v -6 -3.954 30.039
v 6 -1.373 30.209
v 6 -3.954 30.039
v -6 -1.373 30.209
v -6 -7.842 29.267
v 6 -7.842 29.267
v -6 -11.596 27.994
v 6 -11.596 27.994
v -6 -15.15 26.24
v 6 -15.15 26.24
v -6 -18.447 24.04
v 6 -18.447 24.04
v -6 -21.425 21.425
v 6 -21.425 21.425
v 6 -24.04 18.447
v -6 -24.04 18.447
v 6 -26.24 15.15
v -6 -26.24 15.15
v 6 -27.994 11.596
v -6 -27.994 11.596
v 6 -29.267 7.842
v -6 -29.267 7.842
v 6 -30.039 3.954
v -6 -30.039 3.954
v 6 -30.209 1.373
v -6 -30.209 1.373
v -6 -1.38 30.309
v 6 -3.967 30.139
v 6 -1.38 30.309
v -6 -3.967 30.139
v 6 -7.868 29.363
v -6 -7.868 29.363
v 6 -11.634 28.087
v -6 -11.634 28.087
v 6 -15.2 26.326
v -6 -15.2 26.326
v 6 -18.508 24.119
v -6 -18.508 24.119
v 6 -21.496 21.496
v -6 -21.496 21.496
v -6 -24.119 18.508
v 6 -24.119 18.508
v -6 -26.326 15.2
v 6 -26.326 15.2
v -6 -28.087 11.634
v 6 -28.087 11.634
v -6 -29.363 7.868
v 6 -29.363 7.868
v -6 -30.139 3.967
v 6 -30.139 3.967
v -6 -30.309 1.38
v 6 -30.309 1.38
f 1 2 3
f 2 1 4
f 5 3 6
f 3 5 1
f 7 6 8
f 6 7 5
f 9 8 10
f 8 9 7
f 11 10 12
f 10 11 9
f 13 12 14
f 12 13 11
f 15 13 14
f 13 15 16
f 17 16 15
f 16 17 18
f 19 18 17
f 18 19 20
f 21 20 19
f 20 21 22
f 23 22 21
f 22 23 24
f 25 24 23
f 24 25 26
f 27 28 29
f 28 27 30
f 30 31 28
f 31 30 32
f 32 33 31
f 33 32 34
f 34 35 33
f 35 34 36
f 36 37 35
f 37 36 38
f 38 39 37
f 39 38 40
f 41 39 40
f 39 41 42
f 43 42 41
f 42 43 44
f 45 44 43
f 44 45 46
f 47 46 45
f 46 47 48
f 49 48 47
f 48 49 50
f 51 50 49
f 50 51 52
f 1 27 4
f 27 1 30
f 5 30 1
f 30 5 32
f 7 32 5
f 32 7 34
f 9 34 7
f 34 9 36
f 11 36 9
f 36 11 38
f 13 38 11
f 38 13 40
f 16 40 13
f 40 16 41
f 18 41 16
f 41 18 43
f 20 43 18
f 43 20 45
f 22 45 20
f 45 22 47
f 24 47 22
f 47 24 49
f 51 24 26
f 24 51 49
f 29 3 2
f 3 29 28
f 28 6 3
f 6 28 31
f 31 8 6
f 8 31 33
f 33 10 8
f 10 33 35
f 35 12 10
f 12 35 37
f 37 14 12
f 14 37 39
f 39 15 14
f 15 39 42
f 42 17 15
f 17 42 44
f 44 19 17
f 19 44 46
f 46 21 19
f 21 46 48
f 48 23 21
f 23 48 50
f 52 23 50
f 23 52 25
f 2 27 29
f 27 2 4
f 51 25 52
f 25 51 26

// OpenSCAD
use <../lib.scad>
function ldraw_lib__6342869ac01() = [
// 0 Sticker  0.8 x  5.6 Rectangle Chrome (Formed)
// 0 Name: 6342869ac01.dat
// 0 Author: Orion Pobursky [OrionP]
// 0 !LDRAW_ORG Part UPDATE 2022-04
// 0 !LICENSE Licensed under CC BY 2.0 and CC BY 4.0 : see CAreadme.txt
// 
// 0 BFC CERTIFY CCW
  [0,"BFC","CERTIFY"],
  [0,"BFC","CCW"],
// 
// 0 !KEYWORDS Discovery, Set 10283
// 
// 0 !HISTORY 2022-07-18 [PTadmin] Official Update 2022-04
// 
// 
// 4 383 -15 -75.0986 -9.8854 -15 -75.5237 -3.4334 15 -75.5237 -3.4334 15 -75.0986 -9.8854
  [4,383,-15,-75.0986,-9.8854,-15,-75.5237,-3.4334,15,-75.5237,-3.4334,15,-75.0986,-9.8854],
// 4 383 -15 -73.1669 -19.6041 -15 -75.0986 -9.8854 15 -75.0986 -9.8854 15 -73.1669 -19.6041
  [4,383,-15,-73.1669,-19.6041,-15,-75.0986,-9.8854,15,-75.0986,-9.8854,15,-73.1669,-19.6041],
// 4 383 -15 -69.9854 -28.9895 -15 -73.1669 -19.6041 15 -73.1669 -19.6041 15 -69.9854 -28.9895
  [4,383,-15,-69.9854,-28.9895,-15,-73.1669,-19.6041,15,-73.1669,-19.6041,15,-69.9854,-28.9895],
// 4 383 -15 -65.5995 -37.875 -15 -69.9854 -28.9895 15 -69.9854 -28.9895 15 -65.5995 -37.875
  [4,383,-15,-65.5995,-37.875,-15,-69.9854,-28.9895,15,-69.9854,-28.9895,15,-65.5995,-37.875],
// 4 383 -15 -60.1001 -46.1166 -15 -65.5995 -37.875 15 -65.5995 -37.875 15 -60.1001 -46.1166
  [4,383,-15,-60.1001,-46.1166,-15,-65.5995,-37.875,15,-65.5995,-37.875,15,-60.1001,-46.1166],
// 4 383 -15 -53.5628 -53.5628 -15 -60.1001 -46.1166 15 -60.1001 -46.1166 15 -53.5628 -53.5628
  [4,383,-15,-53.5628,-53.5628,-15,-60.1001,-46.1166,15,-60.1001,-46.1166,15,-53.5628,-53.5628],
// 4 383 -15 -46.1166 -60.1001 -15 -53.5628 -53.5628 15 -53.5628 -53.5628 15 -46.1166 -60.1001
  [4,383,-15,-46.1166,-60.1001,-15,-53.5628,-53.5628,15,-53.5628,-53.5628,15,-46.1166,-60.1001],
// 4 383 -15 -37.875 -65.5995 -15 -46.1166 -60.1001 15 -46.1166 -60.1001 15 -37.875 -65.5995
  [4,383,-15,-37.875,-65.5995,-15,-46.1166,-60.1001,15,-46.1166,-60.1001,15,-37.875,-65.5995],
// 4 383 -15 -28.9895 -69.9854 -15 -37.875 -65.5995 15 -37.875 -65.5995 15 -28.9895 -69.9854
  [4,383,-15,-28.9895,-69.9854,-15,-37.875,-65.5995,15,-37.875,-65.5995,15,-28.9895,-69.9854],
// 4 383 -15 -19.6041 -73.1669 -15 -28.9895 -69.9854 15 -28.9895 -69.9854 15 -19.6041 -73.1669
  [4,383,-15,-19.6041,-73.1669,-15,-28.9895,-69.9854,15,-28.9895,-69.9854,15,-19.6041,-73.1669],
// 4 383 -15 -9.8854 -75.0986 -15 -19.6041 -73.1669 15 -19.6041 -73.1669 15 -9.8854 -75.0986
  [4,383,-15,-9.8854,-75.0986,-15,-19.6041,-73.1669,15,-19.6041,-73.1669,15,-9.8854,-75.0986],
// 4 383 -15 -3.4334 -75.5237 -15 -9.8854 -75.0986 15 -9.8854 -75.0986 15 -3.4334 -75.5237
  [4,383,-15,-3.4334,-75.5237,-15,-9.8854,-75.0986,15,-9.8854,-75.0986,15,-3.4334,-75.5237],
// 
// 5 24 15 -75.0986 -9.8854 -15 -75.0986 -9.8854 15 -75.5237 -3.4334 15 -73.1669 -19.6041
  [5,24,15,-75.0986,-9.8854,-15,-75.0986,-9.8854,15,-75.5237,-3.4334,15,-73.1669,-19.6041],
// 5 24 15 -73.1669 -19.6041 -15 -73.1669 -19.6041 15 -75.0986 -9.8854 15 -69.9854 -28.9895
  [5,24,15,-73.1669,-19.6041,-15,-73.1669,-19.6041,15,-75.0986,-9.8854,15,-69.9854,-28.9895],
// 5 24 15 -69.9854 -28.9895 -15 -69.9854 -28.9895 15 -73.1669 -19.6041 15 -65.5995 -37.875
  [5,24,15,-69.9854,-28.9895,-15,-69.9854,-28.9895,15,-73.1669,-19.6041,15,-65.5995,-37.875],
// 5 24 15 -65.5995 -37.875 -15 -65.5995 -37.875 15 -69.9854 -28.9895 15 -60.1001 -46.1166
  [5,24,15,-65.5995,-37.875,-15,-65.5995,-37.875,15,-69.9854,-28.9895,15,-60.1001,-46.1166],
// 5 24 15 -60.1001 -46.1166 -15 -60.1001 -46.1166 15 -65.5995 -37.875 15 -53.5628 -53.5628
  [5,24,15,-60.1001,-46.1166,-15,-60.1001,-46.1166,15,-65.5995,-37.875,15,-53.5628,-53.5628],
// 5 24 15 -53.5628 -53.5628 -15 -53.5628 -53.5628 15 -60.1001 -46.1166 15 -46.1166 -60.1001
  [5,24,15,-53.5628,-53.5628,-15,-53.5628,-53.5628,15,-60.1001,-46.1166,15,-46.1166,-60.1001],
// 5 24 15 -46.1166 -60.1001 -15 -46.1166 -60.1001 15 -53.5628 -53.5628 15 -37.875 -65.5995
  [5,24,15,-46.1166,-60.1001,-15,-46.1166,-60.1001,15,-53.5628,-53.5628,15,-37.875,-65.5995],
// 5 24 15 -37.875 -65.5995 -15 -37.875 -65.5995 15 -46.1166 -60.1001 15 -28.9895 -69.9854
  [5,24,15,-37.875,-65.5995,-15,-37.875,-65.5995,15,-46.1166,-60.1001,15,-28.9895,-69.9854],
// 5 24 15 -28.9895 -69.9854 -15 -28.9895 -69.9854 15 -37.875 -65.5995 15 -19.6041 -73.1669
  [5,24,15,-28.9895,-69.9854,-15,-28.9895,-69.9854,15,-37.875,-65.5995,15,-19.6041,-73.1669],
// 5 24 15 -19.6041 -73.1669 -15 -19.6041 -73.1669 15 -28.9895 -69.9854 15 -9.8854 -75.0986
  [5,24,15,-19.6041,-73.1669,-15,-19.6041,-73.1669,15,-28.9895,-69.9854,15,-9.8854,-75.0986],
// 5 24 15 -9.8854 -75.0986 -15 -9.8854 -75.0986 15 -19.6041 -73.1669 15 -3.4334 -75.5237
  [5,24,15,-9.8854,-75.0986,-15,-9.8854,-75.0986,15,-19.6041,-73.1669,15,-3.4334,-75.5237],
// 
// 4 16 15 -75.7727 -3.4498 -15 -75.7727 -3.4498 -15 -75.3464 -9.918 15 -75.3464 -9.918
  [4,16,15,-75.7727,-3.4498,-15,-75.7727,-3.4498,-15,-75.3464,-9.918,15,-75.3464,-9.918],
// 4 16 15 -75.3464 -9.918 -15 -75.3464 -9.918 -15 -73.4084 -19.6688 15 -73.4084 -19.6688
  [4,16,15,-75.3464,-9.918,-15,-75.3464,-9.918,-15,-73.4084,-19.6688,15,-73.4084,-19.6688],
// 4 16 15 -73.4084 -19.6688 -15 -73.4084 -19.6688 -15 -70.2164 -29.0852 15 -70.2164 -29.0852
  [4,16,15,-73.4084,-19.6688,-15,-73.4084,-19.6688,-15,-70.2164,-29.0852,15,-70.2164,-29.0852],
// 4 16 15 -70.2164 -29.0852 -15 -70.2164 -29.0852 -15 -65.816 -38 15 -65.816 -38
  [4,16,15,-70.2164,-29.0852,-15,-70.2164,-29.0852,-15,-65.816,-38,15,-65.816,-38],
// 4 16 15 -65.816 -38 -15 -65.816 -38 -15 -60.2984 -46.2688 15 -60.2984 -46.2688
  [4,16,15,-65.816,-38,-15,-65.816,-38,-15,-60.2984,-46.2688,15,-60.2984,-46.2688],
// 4 16 15 -60.2984 -46.2688 -15 -60.2984 -46.2688 -15 -53.7396 -53.7396 15 -53.7396 -53.7396
  [4,16,15,-60.2984,-46.2688,-15,-60.2984,-46.2688,-15,-53.7396,-53.7396,15,-53.7396,-53.7396],
// 4 16 15 -53.7396 -53.7396 -15 -53.7396 -53.7396 -15 -46.2688 -60.2984 15 -46.2688 -60.2984
  [4,16,15,-53.7396,-53.7396,-15,-53.7396,-53.7396,-15,-46.2688,-60.2984,15,-46.2688,-60.2984],
// 4 16 15 -46.2688 -60.2984 -15 -46.2688 -60.2984 -15 -38 -65.816 15 -38 -65.816
  [4,16,15,-46.2688,-60.2984,-15,-46.2688,-60.2984,-15,-38,-65.816,15,-38,-65.816],
// 4 16 15 -38 -65.816 -15 -38 -65.816 -15 -29.0852 -70.2164 15 -29.0852 -70.2164
  [4,16,15,-38,-65.816,-15,-38,-65.816,-15,-29.0852,-70.2164,15,-29.0852,-70.2164],
// 4 16 15 -29.0852 -70.2164 -15 -29.0852 -70.2164 -15 -19.6688 -73.4084 15 -19.6688 -73.4084
  [4,16,15,-29.0852,-70.2164,-15,-29.0852,-70.2164,-15,-19.6688,-73.4084,15,-19.6688,-73.4084],
// 4 16 15 -19.6688 -73.4084 -15 -19.6688 -73.4084 -15 -9.918 -75.3464 15 -9.918 -75.3464
  [4,16,15,-19.6688,-73.4084,-15,-19.6688,-73.4084,-15,-9.918,-75.3464,15,-9.918,-75.3464],
// 4 16 15 -9.918 -75.3464 -15 -9.918 -75.3464 -15 -3.4498 -75.7727 15 -3.4498 -75.7727
  [4,16,15,-9.918,-75.3464,-15,-9.918,-75.3464,-15,-3.4498,-75.7727,15,-3.4498,-75.7727],
// 
// 5 24 15 -75.3464 -9.918 -15 -75.3464 -9.918 15 -75.7727 -3.4498 15 -73.4084 -19.6688
  [5,24,15,-75.3464,-9.918,-15,-75.3464,-9.918,15,-75.7727,-3.4498,15,-73.4084,-19.6688],
// 5 24 15 -73.4084 -19.6688 -15 -73.4084 -19.6688 15 -75.3464 -9.918 15 -70.2164 -29.0852
  [5,24,15,-73.4084,-19.6688,-15,-73.4084,-19.6688,15,-75.3464,-9.918,15,-70.2164,-29.0852],
// 5 24 15 -70.2164 -29.0852 -15 -70.2164 -29.0852 15 -73.4084 -19.6688 15 -65.816 -38
  [5,24,15,-70.2164,-29.0852,-15,-70.2164,-29.0852,15,-73.4084,-19.6688,15,-65.816,-38],
// 5 24 15 -65.816 -38 -15 -65.816 -38 15 -70.2164 -29.0852 15 -60.2984 -46.2688
  [5,24,15,-65.816,-38,-15,-65.816,-38,15,-70.2164,-29.0852,15,-60.2984,-46.2688],
// 5 24 15 -60.2984 -46.2688 -15 -60.2984 -46.2688 15 -65.816 -38 15 -53.7396 -53.7396
  [5,24,15,-60.2984,-46.2688,-15,-60.2984,-46.2688,15,-65.816,-38,15,-53.7396,-53.7396],
// 5 24 15 -53.7396 -53.7396 -15 -53.7396 -53.7396 15 -60.2984 -46.2688 15 -46.2688 -60.2984
  [5,24,15,-53.7396,-53.7396,-15,-53.7396,-53.7396,15,-60.2984,-46.2688,15,-46.2688,-60.2984],
// 5 24 15 -46.2688 -60.2984 -15 -46.2688 -60.2984 15 -53.7396 -53.7396 15 -38 -65.816
  [5,24,15,-46.2688,-60.2984,-15,-46.2688,-60.2984,15,-53.7396,-53.7396,15,-38,-65.816],
// 5 24 15 -38 -65.816 -15 -38 -65.816 15 -46.2688 -60.2984 15 -29.0852 -70.2164
  [5,24,15,-38,-65.816,-15,-38,-65.816,15,-46.2688,-60.2984,15,-29.0852,-70.2164],
// 5 24 15 -29.0852 -70.2164 -15 -29.0852 -70.2164 15 -38 -65.816 15 -19.6688 -73.4084
  [5,24,15,-29.0852,-70.2164,-15,-29.0852,-70.2164,15,-38,-65.816,15,-19.6688,-73.4084],
// 5 24 15 -19.6688 -73.4084 -15 -19.6688 -73.4084 15 -29.0852 -70.2164 15 -9.918 -75.3464
  [5,24,15,-19.6688,-73.4084,-15,-19.6688,-73.4084,15,-29.0852,-70.2164,15,-9.918,-75.3464],
// 5 24 15 -9.918 -75.3464 -15 -9.918 -75.3464 15 -19.6688 -73.4084 15 -3.4498 -75.7727
  [5,24,15,-9.918,-75.3464,-15,-9.918,-75.3464,15,-19.6688,-73.4084,15,-3.4498,-75.7727],
// 
// 4 16 -15 -75.0986 -9.8854 -15 -75.3464 -9.918 -15 -75.7727 -3.4498 -15 -75.5237 -3.4334
  [4,16,-15,-75.0986,-9.8854,-15,-75.3464,-9.918,-15,-75.7727,-3.4498,-15,-75.5237,-3.4334],
// 4 16 -15 -73.1669 -19.6041 -15 -73.4084 -19.6688 -15 -75.3464 -9.918 -15 -75.0986 -9.8854
  [4,16,-15,-73.1669,-19.6041,-15,-73.4084,-19.6688,-15,-75.3464,-9.918,-15,-75.0986,-9.8854],
// 4 16 -15 -69.9854 -28.9895 -15 -70.2164 -29.0852 -15 -73.4084 -19.6688 -15 -73.1669 -19.6041
  [4,16,-15,-69.9854,-28.9895,-15,-70.2164,-29.0852,-15,-73.4084,-19.6688,-15,-73.1669,-19.6041],
// 4 16 -15 -65.5995 -37.875 -15 -65.816 -38 -15 -70.2164 -29.0852 -15 -69.9854 -28.9895
  [4,16,-15,-65.5995,-37.875,-15,-65.816,-38,-15,-70.2164,-29.0852,-15,-69.9854,-28.9895],
// 4 16 -15 -60.1001 -46.1166 -15 -60.2984 -46.2688 -15 -65.816 -38 -15 -65.5995 -37.875
  [4,16,-15,-60.1001,-46.1166,-15,-60.2984,-46.2688,-15,-65.816,-38,-15,-65.5995,-37.875],
// 4 16 -15 -53.5628 -53.5628 -15 -53.7396 -53.7396 -15 -60.2984 -46.2688 -15 -60.1001 -46.1166
  [4,16,-15,-53.5628,-53.5628,-15,-53.7396,-53.7396,-15,-60.2984,-46.2688,-15,-60.1001,-46.1166],
// 4 16 -15 -46.1166 -60.1001 -15 -46.2688 -60.2984 -15 -53.7396 -53.7396 -15 -53.5628 -53.5628
  [4,16,-15,-46.1166,-60.1001,-15,-46.2688,-60.2984,-15,-53.7396,-53.7396,-15,-53.5628,-53.5628],
// 4 16 -15 -37.875 -65.5995 -15 -38 -65.816 -15 -46.2688 -60.2984 -15 -46.1166 -60.1001
  [4,16,-15,-37.875,-65.5995,-15,-38,-65.816,-15,-46.2688,-60.2984,-15,-46.1166,-60.1001],
// 4 16 -15 -28.9895 -69.9854 -15 -29.0852 -70.2164 -15 -38 -65.816 -15 -37.875 -65.5995
  [4,16,-15,-28.9895,-69.9854,-15,-29.0852,-70.2164,-15,-38,-65.816,-15,-37.875,-65.5995],
// 4 16 -15 -19.6041 -73.1669 -15 -19.6688 -73.4084 -15 -29.0852 -70.2164 -15 -28.9895 -69.9854
  [4,16,-15,-19.6041,-73.1669,-15,-19.6688,-73.4084,-15,-29.0852,-70.2164,-15,-28.9895,-69.9854],
// 4 16 -15 -9.8854 -75.0986 -15 -9.918 -75.3464 -15 -19.6688 -73.4084 -15 -19.6041 -73.1669
  [4,16,-15,-9.8854,-75.0986,-15,-9.918,-75.3464,-15,-19.6688,-73.4084,-15,-19.6041,-73.1669],
// 4 16 -15 -3.4334 -75.5237 -15 -3.4498 -75.7727 -15 -9.918 -75.3464 -15 -9.8854 -75.0986
  [4,16,-15,-3.4334,-75.5237,-15,-3.4498,-75.7727,-15,-9.918,-75.3464,-15,-9.8854,-75.0986],
// 
// 4 16 15 -75.7727 -3.4498 15 -75.3464 -9.918 15 -75.0986 -9.8854 15 -75.5237 -3.4334
  [4,16,15,-75.7727,-3.4498,15,-75.3464,-9.918,15,-75.0986,-9.8854,15,-75.5237,-3.4334],
// 4 16 15 -75.3464 -9.918 15 -73.4084 -19.6688 15 -73.1669 -19.6041 15 -75.0986 -9.8854
  [4,16,15,-75.3464,-9.918,15,-73.4084,-19.6688,15,-73.1669,-19.6041,15,-75.0986,-9.8854],
// 4 16 15 -73.4084 -19.6688 15 -70.2164 -29.0852 15 -69.9854 -28.9895 15 -73.1669 -19.6041
  [4,16,15,-73.4084,-19.6688,15,-70.2164,-29.0852,15,-69.9854,-28.9895,15,-73.1669,-19.6041],
// 4 16 15 -70.2164 -29.0852 15 -65.816 -38 15 -65.5995 -37.875 15 -69.9854 -28.9895
  [4,16,15,-70.2164,-29.0852,15,-65.816,-38,15,-65.5995,-37.875,15,-69.9854,-28.9895],
// 4 16 15 -65.816 -38 15 -60.2984 -46.2688 15 -60.1001 -46.1166 15 -65.5995 -37.875
  [4,16,15,-65.816,-38,15,-60.2984,-46.2688,15,-60.1001,-46.1166,15,-65.5995,-37.875],
// 4 16 15 -60.2984 -46.2688 15 -53.7396 -53.7396 15 -53.5628 -53.5628 15 -60.1001 -46.1166
  [4,16,15,-60.2984,-46.2688,15,-53.7396,-53.7396,15,-53.5628,-53.5628,15,-60.1001,-46.1166],
// 4 16 15 -53.7396 -53.7396 15 -46.2688 -60.2984 15 -46.1166 -60.1001 15 -53.5628 -53.5628
  [4,16,15,-53.7396,-53.7396,15,-46.2688,-60.2984,15,-46.1166,-60.1001,15,-53.5628,-53.5628],
// 4 16 15 -46.2688 -60.2984 15 -38 -65.816 15 -37.875 -65.5995 15 -46.1166 -60.1001
  [4,16,15,-46.2688,-60.2984,15,-38,-65.816,15,-37.875,-65.5995,15,-46.1166,-60.1001],
// 4 16 15 -38 -65.816 15 -29.0852 -70.2164 15 -28.9895 -69.9854 15 -37.875 -65.5995
  [4,16,15,-38,-65.816,15,-29.0852,-70.2164,15,-28.9895,-69.9854,15,-37.875,-65.5995],
// 4 16 15 -29.0852 -70.2164 15 -19.6688 -73.4084 15 -19.6041 -73.1669 15 -28.9895 -69.9854
  [4,16,15,-29.0852,-70.2164,15,-19.6688,-73.4084,15,-19.6041,-73.1669,15,-28.9895,-69.9854],
// 4 16 15 -19.6688 -73.4084 15 -9.918 -75.3464 15 -9.8854 -75.0986 15 -19.6041 -73.1669
  [4,16,15,-19.6688,-73.4084,15,-9.918,-75.3464,15,-9.8854,-75.0986,15,-19.6041,-73.1669],
// 4 16 15 -9.918 -75.3464 15 -3.4498 -75.7727 15 -3.4334 -75.5237 15 -9.8854 -75.0986
  [4,16,15,-9.918,-75.3464,15,-3.4498,-75.7727,15,-3.4334,-75.5237,15,-9.8854,-75.0986],
// 
// 4 16 -15 -75.7727 -3.4498 15 -75.7727 -3.4498 15 -75.5237 -3.4334 -15 -75.5237 -3.4334
  [4,16,-15,-75.7727,-3.4498,15,-75.7727,-3.4498,15,-75.5237,-3.4334,-15,-75.5237,-3.4334],
// 4 16 15 -3.4498 -75.7727 -15 -3.4498 -75.7727 -15 -3.4334 -75.5237 15 -3.4334 -75.5237
  [4,16,15,-3.4498,-75.7727,-15,-3.4498,-75.7727,-15,-3.4334,-75.5237,15,-3.4334,-75.5237],
];
makepoly(ldraw_lib__6342869ac01(), line=0.2);
